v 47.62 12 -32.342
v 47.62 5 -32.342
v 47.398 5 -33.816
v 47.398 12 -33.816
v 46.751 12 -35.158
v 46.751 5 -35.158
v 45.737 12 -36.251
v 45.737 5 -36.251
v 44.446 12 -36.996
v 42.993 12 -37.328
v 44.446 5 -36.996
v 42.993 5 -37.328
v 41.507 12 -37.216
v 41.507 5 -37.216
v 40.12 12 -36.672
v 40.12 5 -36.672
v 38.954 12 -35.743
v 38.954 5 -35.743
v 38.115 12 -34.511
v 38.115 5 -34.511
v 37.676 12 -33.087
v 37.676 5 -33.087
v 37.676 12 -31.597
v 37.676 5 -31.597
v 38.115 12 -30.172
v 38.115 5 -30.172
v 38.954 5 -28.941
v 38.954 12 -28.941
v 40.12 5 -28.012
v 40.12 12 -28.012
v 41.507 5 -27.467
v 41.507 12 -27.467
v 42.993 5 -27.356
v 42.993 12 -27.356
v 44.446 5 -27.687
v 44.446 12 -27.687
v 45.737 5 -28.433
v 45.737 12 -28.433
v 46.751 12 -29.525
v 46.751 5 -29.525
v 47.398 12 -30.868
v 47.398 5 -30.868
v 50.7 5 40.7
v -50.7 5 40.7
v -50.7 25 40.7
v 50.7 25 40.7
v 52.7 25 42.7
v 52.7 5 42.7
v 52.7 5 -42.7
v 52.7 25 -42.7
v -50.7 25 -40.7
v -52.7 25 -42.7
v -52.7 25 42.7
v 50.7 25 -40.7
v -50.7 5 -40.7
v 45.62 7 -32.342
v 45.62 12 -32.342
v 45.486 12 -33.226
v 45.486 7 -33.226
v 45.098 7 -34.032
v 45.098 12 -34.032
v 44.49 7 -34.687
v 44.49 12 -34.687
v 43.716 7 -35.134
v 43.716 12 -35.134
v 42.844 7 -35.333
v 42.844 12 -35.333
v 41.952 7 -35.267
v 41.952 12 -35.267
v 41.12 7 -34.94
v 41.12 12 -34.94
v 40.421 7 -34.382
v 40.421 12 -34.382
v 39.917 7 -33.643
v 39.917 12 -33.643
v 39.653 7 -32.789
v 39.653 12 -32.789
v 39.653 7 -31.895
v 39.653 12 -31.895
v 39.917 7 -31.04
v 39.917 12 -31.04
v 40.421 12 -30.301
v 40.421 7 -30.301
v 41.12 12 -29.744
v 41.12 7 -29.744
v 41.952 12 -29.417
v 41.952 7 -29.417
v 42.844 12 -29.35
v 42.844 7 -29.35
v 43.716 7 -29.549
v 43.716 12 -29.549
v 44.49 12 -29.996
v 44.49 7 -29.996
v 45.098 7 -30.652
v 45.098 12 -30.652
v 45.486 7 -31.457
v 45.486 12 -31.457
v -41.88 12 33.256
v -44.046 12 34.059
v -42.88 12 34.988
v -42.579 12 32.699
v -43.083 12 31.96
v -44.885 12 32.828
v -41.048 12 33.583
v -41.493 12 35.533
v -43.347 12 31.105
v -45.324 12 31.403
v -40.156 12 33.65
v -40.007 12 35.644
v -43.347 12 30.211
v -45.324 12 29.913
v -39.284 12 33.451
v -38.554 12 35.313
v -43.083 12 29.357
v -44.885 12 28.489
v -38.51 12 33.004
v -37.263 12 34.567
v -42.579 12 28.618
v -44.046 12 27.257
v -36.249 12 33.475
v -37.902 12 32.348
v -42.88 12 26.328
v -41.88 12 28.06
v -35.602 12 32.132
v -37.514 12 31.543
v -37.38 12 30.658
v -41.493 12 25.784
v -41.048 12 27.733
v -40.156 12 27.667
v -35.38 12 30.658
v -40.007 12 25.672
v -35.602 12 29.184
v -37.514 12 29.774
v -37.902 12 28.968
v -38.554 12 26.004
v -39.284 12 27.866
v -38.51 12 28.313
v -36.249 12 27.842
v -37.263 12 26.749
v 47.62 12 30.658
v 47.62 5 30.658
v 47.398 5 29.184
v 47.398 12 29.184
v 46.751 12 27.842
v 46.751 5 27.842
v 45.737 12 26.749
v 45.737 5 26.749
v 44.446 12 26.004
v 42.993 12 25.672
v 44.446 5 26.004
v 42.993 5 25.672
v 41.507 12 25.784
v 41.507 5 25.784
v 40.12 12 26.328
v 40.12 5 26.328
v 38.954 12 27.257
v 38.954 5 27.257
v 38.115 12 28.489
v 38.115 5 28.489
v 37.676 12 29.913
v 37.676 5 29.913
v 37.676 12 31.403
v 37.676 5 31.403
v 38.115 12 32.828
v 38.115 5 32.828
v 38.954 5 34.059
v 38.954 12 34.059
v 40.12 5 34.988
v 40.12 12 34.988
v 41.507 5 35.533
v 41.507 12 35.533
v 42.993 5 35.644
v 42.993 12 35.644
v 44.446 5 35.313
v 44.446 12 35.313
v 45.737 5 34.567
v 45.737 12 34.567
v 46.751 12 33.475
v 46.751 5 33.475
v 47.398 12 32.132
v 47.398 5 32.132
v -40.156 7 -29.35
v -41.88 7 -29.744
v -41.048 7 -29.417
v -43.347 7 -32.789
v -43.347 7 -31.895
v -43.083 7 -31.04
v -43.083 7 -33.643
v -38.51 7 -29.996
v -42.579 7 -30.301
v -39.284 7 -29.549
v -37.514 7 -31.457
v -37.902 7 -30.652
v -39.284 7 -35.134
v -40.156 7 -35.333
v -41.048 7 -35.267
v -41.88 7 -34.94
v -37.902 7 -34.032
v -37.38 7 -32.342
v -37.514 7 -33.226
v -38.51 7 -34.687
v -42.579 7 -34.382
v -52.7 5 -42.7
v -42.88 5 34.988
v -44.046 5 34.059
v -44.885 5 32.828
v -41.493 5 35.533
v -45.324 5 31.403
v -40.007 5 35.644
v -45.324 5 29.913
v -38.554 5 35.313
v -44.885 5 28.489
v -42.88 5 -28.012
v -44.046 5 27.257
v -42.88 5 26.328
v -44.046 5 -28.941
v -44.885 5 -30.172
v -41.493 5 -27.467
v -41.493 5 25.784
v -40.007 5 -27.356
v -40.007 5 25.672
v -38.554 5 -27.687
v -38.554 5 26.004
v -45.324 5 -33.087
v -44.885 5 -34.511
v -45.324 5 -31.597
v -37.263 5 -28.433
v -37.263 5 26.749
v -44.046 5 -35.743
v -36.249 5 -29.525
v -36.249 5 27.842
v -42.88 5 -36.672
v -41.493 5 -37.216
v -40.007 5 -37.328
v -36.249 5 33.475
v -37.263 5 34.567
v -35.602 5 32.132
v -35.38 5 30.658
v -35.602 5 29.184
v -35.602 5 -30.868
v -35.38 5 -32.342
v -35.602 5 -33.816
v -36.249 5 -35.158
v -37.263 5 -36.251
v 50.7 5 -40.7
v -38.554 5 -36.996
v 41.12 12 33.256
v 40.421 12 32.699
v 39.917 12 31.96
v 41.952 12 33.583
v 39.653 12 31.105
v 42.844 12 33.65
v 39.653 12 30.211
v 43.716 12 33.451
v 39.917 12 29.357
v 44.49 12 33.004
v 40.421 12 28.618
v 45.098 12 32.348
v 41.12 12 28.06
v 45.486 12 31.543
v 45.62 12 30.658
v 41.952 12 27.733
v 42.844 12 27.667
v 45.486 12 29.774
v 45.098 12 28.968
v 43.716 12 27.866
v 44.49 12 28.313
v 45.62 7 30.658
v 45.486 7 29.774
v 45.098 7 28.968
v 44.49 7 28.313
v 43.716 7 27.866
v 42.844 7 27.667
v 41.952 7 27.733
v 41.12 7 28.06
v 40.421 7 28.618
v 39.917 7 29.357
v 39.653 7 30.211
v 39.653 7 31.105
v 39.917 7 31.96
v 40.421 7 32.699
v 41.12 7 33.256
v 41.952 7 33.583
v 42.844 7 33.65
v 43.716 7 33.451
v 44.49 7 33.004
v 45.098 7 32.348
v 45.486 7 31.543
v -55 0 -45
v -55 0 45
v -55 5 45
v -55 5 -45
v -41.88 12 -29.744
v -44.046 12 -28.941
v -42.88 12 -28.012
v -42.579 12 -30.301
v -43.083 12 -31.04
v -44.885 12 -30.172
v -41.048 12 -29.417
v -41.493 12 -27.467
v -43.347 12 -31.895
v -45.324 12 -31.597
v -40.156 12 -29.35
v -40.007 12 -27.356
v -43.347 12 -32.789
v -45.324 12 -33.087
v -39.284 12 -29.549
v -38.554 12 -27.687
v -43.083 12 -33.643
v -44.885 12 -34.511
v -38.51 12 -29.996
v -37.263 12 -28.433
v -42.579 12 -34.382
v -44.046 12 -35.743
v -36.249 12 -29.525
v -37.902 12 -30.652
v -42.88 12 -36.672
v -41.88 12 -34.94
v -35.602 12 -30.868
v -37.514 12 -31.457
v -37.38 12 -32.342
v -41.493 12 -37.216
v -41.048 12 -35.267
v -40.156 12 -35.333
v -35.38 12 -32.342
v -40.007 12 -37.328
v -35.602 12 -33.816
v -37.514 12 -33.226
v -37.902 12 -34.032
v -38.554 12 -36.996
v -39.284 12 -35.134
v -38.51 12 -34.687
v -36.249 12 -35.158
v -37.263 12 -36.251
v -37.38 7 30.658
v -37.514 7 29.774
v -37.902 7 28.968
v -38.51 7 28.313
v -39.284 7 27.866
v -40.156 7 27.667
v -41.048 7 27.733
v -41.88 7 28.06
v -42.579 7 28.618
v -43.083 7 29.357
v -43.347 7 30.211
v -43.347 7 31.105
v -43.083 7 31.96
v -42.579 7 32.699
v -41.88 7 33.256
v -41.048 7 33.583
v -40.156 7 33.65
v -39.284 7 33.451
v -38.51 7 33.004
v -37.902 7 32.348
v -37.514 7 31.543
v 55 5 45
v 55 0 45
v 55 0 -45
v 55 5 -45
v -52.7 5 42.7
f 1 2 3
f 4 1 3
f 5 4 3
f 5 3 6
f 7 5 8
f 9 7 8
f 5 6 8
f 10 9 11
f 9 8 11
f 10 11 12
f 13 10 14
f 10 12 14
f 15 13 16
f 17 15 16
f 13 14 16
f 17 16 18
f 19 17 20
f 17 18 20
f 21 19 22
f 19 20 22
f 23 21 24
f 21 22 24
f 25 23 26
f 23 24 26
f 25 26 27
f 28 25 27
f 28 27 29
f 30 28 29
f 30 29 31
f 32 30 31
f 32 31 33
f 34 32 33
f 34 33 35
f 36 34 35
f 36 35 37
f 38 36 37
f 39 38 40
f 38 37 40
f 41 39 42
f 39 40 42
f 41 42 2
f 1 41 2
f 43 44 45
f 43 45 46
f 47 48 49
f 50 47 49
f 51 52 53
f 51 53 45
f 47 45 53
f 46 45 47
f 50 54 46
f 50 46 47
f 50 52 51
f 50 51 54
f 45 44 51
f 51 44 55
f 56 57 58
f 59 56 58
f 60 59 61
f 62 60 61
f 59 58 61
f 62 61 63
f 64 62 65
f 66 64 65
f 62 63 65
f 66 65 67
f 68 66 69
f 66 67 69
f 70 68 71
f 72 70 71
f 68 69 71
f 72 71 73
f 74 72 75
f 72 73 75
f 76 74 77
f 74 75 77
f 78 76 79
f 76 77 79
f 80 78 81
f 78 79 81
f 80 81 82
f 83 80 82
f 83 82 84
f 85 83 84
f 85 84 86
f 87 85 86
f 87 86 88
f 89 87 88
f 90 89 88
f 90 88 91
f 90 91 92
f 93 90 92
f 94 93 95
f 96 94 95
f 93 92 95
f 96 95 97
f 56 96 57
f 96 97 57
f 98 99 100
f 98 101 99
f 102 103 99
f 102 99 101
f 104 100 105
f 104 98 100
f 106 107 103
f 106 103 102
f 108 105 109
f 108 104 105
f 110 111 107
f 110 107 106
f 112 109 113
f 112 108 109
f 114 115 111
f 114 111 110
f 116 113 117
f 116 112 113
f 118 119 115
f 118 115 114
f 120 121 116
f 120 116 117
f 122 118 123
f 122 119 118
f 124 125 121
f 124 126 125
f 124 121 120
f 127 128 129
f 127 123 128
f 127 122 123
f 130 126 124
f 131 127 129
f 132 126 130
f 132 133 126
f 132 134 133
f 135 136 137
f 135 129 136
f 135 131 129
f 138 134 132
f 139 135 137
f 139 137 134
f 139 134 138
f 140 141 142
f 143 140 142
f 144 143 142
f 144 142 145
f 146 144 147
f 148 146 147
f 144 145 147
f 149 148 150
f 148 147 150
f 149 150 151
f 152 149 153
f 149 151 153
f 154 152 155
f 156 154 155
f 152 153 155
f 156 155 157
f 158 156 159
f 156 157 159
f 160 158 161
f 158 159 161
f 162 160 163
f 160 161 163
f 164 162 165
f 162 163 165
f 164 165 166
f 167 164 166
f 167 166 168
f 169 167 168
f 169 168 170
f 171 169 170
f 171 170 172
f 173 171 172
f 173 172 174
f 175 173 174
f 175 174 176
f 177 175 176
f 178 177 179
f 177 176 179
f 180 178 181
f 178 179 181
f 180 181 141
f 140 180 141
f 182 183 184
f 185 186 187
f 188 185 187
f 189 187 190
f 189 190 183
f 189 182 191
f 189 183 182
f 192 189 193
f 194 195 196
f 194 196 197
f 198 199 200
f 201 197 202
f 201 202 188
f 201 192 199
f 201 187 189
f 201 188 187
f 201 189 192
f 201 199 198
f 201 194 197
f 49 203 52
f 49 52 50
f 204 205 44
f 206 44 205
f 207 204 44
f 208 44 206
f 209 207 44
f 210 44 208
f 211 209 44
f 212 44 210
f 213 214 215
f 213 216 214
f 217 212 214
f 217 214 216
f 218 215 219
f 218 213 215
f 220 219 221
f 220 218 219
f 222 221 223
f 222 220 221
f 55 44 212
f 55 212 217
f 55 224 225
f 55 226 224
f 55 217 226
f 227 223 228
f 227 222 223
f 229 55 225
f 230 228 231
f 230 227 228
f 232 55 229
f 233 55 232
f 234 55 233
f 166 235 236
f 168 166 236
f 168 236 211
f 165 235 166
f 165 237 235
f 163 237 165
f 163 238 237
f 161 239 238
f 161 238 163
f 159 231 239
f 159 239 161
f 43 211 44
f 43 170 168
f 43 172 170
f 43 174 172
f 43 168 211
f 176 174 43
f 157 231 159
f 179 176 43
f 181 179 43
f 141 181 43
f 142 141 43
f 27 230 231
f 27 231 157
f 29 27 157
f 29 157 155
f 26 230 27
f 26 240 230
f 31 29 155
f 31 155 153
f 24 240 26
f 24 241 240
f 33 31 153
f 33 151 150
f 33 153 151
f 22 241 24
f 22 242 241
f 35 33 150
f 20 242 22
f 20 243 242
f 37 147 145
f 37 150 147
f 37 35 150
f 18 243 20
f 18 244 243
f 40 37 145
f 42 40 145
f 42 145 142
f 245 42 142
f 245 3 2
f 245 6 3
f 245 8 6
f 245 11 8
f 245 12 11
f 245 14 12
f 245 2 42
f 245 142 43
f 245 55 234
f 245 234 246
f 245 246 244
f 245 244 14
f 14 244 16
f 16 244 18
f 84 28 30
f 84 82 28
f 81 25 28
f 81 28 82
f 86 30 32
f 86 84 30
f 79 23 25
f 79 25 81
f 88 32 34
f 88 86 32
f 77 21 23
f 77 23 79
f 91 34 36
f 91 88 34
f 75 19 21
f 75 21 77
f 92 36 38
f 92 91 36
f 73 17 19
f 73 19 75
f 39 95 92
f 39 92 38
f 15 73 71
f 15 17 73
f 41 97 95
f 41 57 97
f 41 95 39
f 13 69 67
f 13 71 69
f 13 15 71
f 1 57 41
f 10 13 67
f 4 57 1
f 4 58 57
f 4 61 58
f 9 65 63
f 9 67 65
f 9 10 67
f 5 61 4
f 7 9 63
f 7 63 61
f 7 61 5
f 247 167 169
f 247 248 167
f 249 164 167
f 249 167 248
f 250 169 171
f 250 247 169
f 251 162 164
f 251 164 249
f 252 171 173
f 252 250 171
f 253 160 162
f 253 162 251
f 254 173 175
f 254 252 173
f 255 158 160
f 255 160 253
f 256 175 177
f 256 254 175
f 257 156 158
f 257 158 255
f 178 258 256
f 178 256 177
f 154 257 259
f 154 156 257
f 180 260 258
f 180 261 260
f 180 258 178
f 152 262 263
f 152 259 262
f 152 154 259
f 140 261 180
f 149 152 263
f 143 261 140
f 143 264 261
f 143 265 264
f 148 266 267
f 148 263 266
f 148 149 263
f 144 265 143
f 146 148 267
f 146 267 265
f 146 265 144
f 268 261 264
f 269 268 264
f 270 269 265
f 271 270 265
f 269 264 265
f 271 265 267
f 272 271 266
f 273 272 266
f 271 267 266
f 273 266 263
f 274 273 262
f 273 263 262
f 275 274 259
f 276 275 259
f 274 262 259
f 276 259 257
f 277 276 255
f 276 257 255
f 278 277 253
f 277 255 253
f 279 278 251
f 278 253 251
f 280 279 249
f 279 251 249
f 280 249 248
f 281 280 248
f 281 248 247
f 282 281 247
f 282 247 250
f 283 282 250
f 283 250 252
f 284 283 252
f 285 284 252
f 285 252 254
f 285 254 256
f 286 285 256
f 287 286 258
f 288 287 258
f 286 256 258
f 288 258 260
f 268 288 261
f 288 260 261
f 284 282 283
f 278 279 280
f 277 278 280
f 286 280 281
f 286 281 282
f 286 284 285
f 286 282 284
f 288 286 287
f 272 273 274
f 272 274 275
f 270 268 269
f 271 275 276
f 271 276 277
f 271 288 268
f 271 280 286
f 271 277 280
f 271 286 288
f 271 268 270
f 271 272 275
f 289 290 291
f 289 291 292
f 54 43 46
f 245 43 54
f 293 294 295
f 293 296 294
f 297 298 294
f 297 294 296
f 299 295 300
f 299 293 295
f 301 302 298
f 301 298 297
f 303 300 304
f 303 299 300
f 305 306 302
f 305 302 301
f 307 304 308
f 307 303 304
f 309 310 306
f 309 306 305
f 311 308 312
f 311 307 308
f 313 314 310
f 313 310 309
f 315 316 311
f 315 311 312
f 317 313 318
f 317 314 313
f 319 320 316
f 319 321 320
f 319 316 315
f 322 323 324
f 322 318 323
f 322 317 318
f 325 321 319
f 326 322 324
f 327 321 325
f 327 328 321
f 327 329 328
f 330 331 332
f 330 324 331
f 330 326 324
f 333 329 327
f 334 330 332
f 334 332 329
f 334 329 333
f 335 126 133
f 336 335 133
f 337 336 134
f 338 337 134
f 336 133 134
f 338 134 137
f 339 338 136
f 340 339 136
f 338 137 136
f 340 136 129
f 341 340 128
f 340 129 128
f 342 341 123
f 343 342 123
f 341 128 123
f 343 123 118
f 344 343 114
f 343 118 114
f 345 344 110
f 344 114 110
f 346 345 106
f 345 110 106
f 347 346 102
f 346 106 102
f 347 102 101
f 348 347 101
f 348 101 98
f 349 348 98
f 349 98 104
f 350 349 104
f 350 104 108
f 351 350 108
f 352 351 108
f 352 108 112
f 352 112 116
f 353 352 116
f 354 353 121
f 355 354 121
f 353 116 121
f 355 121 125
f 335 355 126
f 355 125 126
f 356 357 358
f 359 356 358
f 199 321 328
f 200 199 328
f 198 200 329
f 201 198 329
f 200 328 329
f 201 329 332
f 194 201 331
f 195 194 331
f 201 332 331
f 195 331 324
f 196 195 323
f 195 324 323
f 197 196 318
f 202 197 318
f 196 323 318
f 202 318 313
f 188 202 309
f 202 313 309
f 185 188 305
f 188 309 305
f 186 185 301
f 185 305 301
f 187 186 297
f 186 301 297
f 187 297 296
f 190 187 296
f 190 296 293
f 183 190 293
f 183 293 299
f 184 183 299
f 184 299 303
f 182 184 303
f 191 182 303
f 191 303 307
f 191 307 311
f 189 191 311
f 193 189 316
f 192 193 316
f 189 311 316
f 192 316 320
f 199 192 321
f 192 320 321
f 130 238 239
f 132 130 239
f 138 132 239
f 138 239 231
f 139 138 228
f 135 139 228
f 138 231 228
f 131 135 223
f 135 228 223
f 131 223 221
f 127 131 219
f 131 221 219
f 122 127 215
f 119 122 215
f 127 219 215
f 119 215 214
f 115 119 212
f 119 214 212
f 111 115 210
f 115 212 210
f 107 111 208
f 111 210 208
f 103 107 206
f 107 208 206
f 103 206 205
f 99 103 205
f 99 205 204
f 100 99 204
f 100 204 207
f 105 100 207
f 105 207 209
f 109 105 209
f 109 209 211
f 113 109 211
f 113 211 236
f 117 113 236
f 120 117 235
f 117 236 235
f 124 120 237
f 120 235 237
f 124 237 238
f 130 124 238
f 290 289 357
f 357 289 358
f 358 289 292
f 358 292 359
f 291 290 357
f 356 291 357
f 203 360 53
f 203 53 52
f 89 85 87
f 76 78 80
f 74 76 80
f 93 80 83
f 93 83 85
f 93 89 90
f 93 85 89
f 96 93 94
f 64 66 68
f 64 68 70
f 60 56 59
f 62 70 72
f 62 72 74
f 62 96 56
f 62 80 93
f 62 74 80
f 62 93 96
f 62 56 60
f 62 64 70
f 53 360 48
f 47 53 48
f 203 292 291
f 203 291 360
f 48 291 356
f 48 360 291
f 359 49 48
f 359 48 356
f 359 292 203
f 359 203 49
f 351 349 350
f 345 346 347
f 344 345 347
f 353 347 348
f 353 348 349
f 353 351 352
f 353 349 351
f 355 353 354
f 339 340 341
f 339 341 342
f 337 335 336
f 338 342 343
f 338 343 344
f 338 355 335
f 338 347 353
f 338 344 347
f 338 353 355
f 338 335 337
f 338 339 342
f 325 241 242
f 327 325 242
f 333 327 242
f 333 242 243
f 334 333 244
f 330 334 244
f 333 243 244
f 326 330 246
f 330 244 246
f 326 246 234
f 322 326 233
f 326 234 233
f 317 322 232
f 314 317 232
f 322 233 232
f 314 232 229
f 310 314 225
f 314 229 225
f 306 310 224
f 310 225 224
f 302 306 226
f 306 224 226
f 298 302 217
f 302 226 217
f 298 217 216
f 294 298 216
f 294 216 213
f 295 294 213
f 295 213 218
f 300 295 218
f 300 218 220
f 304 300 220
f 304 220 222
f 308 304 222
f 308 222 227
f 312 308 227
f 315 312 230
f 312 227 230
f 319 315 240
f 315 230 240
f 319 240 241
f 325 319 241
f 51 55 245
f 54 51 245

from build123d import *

# Parameters (mm, degrees)
SKETCH1_W           = 110
SKETCH1_H           = 90
BOSS_EXTRUDE1_DEPTH = 5
SKETCH4_W           = 105.4
SKETCH4_H           = 85.4
SKETCH4_W_2         = 101.4
SKETCH4_H_2         = 81.4
BOSS_EXTRUDE2_DEPTH = 20
SKETCH5_R           = 5
BOSS_EXTRUDE3_DEPTH = 7
SKETCH6_R           = 3
CUT_EXTRUDE1_DEPTH  = 5


with BuildPart() as part:
    # Sketch1 → Boss-Extrude1 (new body)
    with BuildSketch(Plane(origin=(0, 0, 0), x_dir=(1, 0, 0), z_dir=(0, 1, 0))):
        Rectangle(SKETCH1_W, SKETCH1_H)
    extrude(amount=BOSS_EXTRUDE1_DEPTH)

    # Sketch4 → Boss-Extrude2 (add)
    with BuildSketch(Plane(origin=(0, 5, 0), x_dir=(1, 0, 0), z_dir=(0, 1, 0))):
        Rectangle(SKETCH4_W, SKETCH4_H)
        Rectangle(SKETCH4_W_2, SKETCH4_H_2, mode=Mode.SUBTRACT)
    extrude(amount=BOSS_EXTRUDE2_DEPTH)

    # Sketch5 → Boss-Extrude3 (add)
    with BuildSketch(Plane(origin=(0, 5, 0), x_dir=(1, 0, 0), z_dir=(0, 1, 0))):
        with Locations((-40.380300674, 32.341761364)):
            Circle(SKETCH5_R)
        with Locations((-40.380300674, -30.658238636)):
            Circle(SKETCH5_R)
        with Locations((42.619699326, -30.658238636)):
            Circle(SKETCH5_R)
        with Locations((42.619699326, 32.341761364)):
            Circle(SKETCH5_R)
    extrude(amount=BOSS_EXTRUDE3_DEPTH)

    # Sketch6 → Cut-Extrude1 (cut)
    with BuildSketch(Plane(origin=(0, 12, 0), x_dir=(1, 0, 0), z_dir=(0, 1, 0))):
        with Locations((-40.380300674, 32.341761364)):
            Circle(SKETCH6_R)
        with Locations((-40.380300674, -30.658238636)):
            Circle(SKETCH6_R)
        with Locations((42.619699326, -30.658238636)):
            Circle(SKETCH6_R)
        with Locations((42.619699326, 32.341761364)):
            Circle(SKETCH6_R)
    extrude(amount=-CUT_EXTRUDE1_DEPTH, mode=Mode.SUBTRACT)


solid = part.part
